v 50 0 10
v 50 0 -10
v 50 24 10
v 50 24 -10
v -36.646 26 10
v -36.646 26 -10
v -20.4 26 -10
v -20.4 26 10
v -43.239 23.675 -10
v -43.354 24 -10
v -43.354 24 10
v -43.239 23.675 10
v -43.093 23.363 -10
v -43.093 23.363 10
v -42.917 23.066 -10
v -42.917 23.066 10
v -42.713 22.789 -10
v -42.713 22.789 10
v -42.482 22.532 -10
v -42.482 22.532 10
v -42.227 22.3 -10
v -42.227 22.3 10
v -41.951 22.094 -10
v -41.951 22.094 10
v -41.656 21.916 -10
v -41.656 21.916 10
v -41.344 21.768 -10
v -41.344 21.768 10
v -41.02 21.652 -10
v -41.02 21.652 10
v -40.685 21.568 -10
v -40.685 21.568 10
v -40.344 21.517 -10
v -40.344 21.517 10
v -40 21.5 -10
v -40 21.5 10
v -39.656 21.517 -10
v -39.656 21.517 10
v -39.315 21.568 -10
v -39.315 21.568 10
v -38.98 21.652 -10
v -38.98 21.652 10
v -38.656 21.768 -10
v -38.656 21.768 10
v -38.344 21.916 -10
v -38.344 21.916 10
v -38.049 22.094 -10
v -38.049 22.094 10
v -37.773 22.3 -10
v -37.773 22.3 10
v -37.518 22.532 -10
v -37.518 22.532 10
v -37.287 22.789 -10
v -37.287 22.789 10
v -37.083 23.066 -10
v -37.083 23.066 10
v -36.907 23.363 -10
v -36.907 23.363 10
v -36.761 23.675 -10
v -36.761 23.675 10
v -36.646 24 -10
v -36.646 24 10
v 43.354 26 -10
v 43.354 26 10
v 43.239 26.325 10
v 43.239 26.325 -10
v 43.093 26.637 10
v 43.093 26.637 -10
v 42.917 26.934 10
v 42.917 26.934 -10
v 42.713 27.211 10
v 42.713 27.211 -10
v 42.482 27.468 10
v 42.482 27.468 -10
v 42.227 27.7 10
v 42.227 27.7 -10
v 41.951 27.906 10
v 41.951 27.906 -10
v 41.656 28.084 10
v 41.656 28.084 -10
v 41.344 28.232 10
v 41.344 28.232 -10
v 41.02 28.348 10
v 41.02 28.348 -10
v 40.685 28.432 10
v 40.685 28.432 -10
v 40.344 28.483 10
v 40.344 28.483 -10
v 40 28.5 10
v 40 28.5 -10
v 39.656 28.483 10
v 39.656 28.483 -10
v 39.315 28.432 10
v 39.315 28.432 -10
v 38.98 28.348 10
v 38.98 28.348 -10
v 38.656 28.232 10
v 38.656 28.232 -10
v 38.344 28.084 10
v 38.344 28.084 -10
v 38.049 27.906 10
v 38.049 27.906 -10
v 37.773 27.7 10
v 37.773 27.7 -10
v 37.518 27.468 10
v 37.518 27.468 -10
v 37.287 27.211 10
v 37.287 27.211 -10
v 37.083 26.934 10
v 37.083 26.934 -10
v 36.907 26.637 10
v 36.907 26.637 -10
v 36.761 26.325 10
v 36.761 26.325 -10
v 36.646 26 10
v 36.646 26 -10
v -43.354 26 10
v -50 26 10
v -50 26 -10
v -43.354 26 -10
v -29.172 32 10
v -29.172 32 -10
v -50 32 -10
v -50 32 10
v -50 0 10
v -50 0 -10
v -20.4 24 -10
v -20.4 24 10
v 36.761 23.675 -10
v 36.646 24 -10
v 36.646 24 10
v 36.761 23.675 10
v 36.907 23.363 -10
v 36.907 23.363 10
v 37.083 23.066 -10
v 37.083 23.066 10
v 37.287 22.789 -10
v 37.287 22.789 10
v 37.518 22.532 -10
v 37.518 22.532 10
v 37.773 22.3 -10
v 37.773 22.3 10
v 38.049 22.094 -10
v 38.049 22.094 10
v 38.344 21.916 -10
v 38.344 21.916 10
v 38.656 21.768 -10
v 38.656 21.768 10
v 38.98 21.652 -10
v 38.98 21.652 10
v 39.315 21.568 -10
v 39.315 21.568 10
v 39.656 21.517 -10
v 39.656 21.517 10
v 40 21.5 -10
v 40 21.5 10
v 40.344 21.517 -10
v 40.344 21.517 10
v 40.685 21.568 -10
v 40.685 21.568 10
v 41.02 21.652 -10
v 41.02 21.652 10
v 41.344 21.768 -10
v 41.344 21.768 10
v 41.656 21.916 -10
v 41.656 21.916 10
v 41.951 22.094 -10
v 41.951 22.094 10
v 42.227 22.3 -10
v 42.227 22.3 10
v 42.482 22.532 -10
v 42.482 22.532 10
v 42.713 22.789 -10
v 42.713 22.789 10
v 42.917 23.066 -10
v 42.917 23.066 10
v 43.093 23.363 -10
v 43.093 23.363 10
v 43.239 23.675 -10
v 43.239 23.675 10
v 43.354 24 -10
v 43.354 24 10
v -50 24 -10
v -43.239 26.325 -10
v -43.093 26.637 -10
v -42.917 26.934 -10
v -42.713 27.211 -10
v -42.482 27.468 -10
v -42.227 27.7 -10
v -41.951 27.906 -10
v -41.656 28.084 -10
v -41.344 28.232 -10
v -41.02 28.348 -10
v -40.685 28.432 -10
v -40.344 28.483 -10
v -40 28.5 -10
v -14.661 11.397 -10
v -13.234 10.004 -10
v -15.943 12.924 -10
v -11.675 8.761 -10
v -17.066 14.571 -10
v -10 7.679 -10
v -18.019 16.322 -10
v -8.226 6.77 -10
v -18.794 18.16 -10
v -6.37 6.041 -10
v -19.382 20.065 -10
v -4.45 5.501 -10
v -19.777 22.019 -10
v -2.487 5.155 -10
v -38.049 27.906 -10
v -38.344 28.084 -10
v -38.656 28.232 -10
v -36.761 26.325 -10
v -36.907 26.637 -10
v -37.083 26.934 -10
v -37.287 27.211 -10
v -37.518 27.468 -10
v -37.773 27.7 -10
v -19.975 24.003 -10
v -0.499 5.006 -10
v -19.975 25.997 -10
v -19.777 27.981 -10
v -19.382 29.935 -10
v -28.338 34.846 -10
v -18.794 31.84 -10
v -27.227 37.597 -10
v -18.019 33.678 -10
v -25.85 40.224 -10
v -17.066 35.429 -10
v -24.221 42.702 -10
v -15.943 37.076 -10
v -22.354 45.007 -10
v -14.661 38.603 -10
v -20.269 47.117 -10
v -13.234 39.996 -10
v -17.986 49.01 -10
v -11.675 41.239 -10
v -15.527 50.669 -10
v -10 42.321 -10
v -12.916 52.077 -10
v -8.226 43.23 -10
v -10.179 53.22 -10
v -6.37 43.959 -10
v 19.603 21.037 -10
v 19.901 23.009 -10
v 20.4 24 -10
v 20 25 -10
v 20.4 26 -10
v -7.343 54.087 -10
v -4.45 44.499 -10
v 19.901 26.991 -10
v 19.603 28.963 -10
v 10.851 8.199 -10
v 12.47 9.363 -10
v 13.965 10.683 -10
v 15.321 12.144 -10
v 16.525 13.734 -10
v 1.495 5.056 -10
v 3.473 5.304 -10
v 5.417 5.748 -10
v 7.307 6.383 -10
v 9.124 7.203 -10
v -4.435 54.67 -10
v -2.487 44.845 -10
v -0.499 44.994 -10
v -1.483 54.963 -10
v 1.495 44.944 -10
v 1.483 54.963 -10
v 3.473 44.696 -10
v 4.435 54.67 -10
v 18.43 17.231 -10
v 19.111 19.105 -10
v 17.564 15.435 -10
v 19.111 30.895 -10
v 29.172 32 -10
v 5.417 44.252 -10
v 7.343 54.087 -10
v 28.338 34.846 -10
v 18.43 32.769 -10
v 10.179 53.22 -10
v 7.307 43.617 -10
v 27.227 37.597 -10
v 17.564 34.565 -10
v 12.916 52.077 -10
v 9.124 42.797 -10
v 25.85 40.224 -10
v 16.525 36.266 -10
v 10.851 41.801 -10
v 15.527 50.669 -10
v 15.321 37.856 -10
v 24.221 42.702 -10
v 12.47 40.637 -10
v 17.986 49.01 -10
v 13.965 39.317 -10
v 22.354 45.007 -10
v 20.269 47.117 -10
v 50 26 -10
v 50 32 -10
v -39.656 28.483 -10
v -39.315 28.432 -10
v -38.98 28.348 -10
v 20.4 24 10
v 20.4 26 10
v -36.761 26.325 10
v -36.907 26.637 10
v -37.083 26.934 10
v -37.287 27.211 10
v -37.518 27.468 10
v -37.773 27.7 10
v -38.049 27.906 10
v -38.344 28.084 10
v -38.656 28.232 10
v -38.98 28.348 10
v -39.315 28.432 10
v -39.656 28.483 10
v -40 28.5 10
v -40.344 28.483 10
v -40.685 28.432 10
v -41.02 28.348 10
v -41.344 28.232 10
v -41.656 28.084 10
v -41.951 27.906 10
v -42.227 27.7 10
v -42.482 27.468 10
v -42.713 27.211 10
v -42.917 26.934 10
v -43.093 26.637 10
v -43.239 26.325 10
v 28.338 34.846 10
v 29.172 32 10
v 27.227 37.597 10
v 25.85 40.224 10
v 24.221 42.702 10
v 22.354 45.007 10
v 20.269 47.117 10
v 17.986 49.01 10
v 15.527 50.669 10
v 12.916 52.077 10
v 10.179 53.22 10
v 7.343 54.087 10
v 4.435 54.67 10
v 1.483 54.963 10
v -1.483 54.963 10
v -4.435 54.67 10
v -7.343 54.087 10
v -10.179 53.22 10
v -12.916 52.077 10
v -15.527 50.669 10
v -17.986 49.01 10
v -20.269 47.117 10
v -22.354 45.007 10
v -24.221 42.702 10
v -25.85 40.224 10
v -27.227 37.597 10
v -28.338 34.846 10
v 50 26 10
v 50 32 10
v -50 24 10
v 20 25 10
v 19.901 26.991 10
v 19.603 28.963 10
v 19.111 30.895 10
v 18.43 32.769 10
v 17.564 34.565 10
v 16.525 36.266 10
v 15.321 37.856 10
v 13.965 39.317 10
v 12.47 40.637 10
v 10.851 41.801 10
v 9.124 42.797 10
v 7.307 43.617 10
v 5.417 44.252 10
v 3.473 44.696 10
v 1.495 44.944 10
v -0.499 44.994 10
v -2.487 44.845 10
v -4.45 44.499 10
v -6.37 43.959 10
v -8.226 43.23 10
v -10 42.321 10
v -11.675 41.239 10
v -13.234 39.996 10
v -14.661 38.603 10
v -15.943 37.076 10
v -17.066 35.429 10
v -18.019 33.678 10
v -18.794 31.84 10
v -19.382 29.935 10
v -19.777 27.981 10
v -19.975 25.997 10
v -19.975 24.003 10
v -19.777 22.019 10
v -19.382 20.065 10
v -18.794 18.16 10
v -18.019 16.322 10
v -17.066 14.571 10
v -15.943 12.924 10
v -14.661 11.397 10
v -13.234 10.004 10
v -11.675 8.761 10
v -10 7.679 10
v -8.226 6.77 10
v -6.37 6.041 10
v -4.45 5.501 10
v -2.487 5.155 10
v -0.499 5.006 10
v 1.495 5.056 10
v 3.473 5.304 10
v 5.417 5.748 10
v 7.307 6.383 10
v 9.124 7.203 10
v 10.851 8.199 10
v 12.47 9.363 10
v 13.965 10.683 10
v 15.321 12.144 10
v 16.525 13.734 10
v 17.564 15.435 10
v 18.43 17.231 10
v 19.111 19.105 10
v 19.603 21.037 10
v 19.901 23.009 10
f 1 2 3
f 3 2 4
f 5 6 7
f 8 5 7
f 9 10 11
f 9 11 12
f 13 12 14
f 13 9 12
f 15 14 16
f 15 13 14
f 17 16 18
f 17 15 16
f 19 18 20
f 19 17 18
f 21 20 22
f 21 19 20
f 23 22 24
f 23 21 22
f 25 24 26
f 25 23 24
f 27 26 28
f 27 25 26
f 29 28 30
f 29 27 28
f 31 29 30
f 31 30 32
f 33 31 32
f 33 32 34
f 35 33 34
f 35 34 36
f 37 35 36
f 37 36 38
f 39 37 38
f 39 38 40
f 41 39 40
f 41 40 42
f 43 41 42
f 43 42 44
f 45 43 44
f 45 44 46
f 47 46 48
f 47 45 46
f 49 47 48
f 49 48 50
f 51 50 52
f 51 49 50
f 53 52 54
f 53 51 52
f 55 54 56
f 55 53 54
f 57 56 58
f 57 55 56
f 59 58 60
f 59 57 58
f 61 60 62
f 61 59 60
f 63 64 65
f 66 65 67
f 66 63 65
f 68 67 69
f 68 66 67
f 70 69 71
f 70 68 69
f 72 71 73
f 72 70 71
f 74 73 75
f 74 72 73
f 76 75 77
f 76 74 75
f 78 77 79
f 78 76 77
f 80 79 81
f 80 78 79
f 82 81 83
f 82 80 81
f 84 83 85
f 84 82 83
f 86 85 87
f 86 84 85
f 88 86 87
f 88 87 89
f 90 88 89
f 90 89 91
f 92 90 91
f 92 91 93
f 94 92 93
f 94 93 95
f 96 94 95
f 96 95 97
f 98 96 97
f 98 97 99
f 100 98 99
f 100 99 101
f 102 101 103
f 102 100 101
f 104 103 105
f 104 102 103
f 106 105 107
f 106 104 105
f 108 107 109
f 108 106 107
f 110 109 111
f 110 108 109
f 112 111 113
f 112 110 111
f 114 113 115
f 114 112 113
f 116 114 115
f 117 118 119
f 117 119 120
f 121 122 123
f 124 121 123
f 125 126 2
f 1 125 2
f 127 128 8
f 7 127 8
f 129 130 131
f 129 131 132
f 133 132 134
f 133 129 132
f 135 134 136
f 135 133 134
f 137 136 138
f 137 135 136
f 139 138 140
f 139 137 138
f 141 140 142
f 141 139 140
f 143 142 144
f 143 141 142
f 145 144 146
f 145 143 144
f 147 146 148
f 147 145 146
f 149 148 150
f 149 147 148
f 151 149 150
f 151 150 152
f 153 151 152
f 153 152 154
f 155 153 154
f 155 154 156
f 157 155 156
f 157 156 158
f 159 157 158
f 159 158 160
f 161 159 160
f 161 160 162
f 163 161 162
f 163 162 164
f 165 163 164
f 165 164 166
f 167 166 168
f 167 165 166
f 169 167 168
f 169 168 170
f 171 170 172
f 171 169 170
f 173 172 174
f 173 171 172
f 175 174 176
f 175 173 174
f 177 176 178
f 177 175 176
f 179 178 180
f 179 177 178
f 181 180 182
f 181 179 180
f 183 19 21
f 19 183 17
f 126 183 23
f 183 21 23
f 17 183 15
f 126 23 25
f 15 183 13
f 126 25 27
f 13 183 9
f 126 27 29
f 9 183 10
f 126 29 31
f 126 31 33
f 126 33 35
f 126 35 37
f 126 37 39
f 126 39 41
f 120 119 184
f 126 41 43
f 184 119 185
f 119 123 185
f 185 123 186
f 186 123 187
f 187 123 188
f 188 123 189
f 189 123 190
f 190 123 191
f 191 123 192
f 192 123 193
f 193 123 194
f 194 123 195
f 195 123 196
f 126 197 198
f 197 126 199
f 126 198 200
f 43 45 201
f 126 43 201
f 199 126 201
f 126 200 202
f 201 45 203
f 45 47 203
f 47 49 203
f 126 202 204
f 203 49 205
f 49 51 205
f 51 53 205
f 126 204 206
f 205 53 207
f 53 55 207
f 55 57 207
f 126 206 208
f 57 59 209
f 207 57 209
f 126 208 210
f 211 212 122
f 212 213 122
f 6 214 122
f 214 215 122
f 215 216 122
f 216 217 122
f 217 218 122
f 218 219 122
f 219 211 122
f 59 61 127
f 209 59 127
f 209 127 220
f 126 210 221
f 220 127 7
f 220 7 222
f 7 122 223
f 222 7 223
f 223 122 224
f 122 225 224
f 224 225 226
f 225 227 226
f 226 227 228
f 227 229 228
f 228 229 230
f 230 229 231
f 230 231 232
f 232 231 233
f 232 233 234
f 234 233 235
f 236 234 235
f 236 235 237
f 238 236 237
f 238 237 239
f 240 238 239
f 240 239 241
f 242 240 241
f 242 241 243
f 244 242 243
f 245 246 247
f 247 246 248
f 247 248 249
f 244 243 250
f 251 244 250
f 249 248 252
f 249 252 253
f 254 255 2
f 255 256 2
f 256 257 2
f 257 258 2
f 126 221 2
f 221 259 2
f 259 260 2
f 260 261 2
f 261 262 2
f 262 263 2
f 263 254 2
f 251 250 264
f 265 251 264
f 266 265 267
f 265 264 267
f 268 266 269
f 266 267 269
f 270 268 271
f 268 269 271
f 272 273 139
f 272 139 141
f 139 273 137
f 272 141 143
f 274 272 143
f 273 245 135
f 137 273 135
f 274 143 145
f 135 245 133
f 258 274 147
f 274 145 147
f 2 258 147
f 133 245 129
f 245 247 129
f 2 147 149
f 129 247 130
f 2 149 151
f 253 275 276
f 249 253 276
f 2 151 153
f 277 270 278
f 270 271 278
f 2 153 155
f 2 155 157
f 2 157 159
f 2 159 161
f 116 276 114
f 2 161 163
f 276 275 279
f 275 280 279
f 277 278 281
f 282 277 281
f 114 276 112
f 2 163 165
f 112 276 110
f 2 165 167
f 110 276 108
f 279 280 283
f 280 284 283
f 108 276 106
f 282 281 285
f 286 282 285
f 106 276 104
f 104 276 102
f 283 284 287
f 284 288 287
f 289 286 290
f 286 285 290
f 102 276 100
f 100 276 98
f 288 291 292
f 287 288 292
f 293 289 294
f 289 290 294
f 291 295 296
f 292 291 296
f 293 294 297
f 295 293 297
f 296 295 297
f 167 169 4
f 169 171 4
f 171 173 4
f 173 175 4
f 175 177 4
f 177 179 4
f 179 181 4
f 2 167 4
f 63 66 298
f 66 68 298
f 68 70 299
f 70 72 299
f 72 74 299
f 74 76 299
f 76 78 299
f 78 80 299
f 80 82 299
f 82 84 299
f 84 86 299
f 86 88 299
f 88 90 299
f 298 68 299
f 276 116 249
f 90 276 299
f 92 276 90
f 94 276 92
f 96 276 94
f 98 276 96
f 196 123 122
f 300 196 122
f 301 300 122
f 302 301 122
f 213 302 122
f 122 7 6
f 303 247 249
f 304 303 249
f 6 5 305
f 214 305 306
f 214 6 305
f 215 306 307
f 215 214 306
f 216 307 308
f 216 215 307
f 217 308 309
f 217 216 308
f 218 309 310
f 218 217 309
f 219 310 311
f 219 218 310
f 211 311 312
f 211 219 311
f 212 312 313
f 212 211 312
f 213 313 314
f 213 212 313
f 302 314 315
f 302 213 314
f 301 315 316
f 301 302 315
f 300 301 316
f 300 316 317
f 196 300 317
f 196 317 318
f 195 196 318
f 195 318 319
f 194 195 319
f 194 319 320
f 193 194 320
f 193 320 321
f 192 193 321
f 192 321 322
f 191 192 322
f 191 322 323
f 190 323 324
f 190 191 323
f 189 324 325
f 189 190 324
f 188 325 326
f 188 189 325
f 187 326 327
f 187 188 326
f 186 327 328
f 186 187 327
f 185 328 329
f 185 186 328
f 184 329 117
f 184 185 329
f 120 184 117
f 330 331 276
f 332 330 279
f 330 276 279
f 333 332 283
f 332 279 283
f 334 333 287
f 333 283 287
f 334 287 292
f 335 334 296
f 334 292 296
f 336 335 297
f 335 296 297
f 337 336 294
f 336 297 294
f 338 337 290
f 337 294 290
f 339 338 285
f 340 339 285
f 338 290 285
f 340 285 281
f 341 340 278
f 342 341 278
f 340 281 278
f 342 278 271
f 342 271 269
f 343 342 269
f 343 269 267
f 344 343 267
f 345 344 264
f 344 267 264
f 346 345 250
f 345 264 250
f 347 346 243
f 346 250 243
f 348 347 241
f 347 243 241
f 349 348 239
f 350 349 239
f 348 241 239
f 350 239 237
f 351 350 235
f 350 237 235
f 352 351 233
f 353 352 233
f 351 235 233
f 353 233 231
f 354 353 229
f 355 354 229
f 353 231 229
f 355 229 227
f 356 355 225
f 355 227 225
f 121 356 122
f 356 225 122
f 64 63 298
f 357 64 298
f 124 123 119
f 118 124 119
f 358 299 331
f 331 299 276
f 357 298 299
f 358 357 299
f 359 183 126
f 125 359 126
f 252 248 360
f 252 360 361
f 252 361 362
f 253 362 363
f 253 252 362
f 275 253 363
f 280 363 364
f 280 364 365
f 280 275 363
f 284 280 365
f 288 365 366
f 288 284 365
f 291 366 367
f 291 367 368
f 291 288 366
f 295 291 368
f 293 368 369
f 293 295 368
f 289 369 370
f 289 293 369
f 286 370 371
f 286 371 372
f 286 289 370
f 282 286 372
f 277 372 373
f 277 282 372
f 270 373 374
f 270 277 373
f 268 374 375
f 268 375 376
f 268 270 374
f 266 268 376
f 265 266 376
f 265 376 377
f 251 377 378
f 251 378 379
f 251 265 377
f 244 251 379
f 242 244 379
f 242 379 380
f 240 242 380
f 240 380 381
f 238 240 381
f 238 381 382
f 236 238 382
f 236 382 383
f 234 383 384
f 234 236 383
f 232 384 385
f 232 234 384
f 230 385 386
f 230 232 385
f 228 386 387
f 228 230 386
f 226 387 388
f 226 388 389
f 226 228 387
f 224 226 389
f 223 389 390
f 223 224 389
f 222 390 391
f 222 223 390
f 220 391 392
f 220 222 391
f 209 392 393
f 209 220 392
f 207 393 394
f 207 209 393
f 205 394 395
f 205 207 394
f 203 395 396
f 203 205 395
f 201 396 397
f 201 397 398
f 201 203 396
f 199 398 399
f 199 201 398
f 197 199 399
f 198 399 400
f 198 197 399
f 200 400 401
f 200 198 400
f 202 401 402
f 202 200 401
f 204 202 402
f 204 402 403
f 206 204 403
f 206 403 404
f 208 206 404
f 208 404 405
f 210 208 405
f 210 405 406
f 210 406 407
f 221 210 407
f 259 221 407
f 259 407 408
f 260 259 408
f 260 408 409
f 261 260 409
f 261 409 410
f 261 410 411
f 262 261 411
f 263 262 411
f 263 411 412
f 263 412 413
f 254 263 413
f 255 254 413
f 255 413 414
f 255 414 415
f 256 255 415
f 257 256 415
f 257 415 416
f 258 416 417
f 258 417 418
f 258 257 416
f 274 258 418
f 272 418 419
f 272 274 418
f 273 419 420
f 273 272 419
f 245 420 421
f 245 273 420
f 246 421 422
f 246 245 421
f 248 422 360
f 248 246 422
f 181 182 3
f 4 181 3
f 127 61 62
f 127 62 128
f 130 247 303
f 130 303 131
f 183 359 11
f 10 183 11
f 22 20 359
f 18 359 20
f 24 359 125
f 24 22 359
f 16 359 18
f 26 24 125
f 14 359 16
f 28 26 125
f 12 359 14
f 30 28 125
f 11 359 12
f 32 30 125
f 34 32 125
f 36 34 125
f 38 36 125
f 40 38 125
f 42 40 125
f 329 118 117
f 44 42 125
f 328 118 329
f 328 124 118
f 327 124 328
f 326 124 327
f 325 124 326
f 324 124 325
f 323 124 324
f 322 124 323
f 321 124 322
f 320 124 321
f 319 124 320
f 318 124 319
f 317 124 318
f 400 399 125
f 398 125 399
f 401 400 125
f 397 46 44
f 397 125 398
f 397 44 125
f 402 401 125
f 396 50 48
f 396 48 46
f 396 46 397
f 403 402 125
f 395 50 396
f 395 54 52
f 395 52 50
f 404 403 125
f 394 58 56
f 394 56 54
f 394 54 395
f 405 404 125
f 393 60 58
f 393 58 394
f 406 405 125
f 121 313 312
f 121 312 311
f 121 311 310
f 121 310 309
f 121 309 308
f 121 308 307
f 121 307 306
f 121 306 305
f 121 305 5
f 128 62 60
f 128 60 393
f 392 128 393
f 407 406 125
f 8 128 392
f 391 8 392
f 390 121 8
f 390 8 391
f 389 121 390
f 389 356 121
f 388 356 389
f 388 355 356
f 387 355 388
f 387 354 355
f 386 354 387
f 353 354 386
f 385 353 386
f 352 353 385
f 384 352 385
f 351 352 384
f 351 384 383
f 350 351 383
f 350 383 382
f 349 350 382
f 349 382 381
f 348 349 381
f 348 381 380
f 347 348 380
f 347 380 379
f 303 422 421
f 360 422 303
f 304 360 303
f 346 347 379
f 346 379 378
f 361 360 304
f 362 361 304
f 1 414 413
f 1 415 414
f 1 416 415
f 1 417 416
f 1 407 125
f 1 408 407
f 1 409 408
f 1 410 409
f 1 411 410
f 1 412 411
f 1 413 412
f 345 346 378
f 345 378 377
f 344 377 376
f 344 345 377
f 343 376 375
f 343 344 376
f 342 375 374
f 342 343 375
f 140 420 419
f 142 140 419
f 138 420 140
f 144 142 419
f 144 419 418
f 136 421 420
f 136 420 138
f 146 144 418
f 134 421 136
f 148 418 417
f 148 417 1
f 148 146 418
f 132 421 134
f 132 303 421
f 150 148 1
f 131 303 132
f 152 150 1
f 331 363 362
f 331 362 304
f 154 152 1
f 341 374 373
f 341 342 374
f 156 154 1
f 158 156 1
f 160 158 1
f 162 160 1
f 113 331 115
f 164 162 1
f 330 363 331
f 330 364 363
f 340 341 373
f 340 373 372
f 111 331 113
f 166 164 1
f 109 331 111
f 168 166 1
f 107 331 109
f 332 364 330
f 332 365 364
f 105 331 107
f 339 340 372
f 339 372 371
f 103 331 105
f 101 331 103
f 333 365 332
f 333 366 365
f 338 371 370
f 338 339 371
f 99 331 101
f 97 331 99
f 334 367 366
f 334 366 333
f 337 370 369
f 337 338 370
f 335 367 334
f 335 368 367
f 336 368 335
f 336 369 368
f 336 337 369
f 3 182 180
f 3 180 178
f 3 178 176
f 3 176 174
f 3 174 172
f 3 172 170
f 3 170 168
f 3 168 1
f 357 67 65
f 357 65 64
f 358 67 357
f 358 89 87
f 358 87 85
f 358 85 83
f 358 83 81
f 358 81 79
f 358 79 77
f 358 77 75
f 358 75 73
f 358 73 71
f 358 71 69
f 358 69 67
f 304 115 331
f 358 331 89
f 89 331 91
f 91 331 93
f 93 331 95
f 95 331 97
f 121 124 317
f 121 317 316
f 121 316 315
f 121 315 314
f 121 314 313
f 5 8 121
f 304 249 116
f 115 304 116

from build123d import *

# Parameters (mm, degrees)
SKETCH_6_R          = 20
EXTRUDE_6_DEPTH     = 20
SKETCH_8_W          = 30.6
SKETCH_8_H          = 2
CUT_EXTRUDE_2_DEPTH = 101
SKETCH_9_R          = 3.5
CUT_EXTRUDE_3_DEPTH = 77.97401861


with BuildPart() as part:
    # 草图6 → 凸台-拉伸6 (new body)
    with BuildSketch(Plane.XY.offset(-10)):
        with BuildLine():
            Line((-50, 0), (50, 0))
            Line((50, 0), (50, 32))
            Line((50, 32), (29.1719, 32))
            ThreePointArc((29.1719, 32), (0, 54.999995827), (-29.1719, 32))
            Line((-29.1719, 32), (-50, 32))
            Line((-50, 32), (-50, 0))
        make_face()
        with Locations((0, 25)):
            Circle(SKETCH_6_R, mode=Mode.SUBTRACT)
    extrude(amount=EXTRUDE_6_DEPTH)

    # 草图8 → 切除-拉伸2 (cut, symmetric)
    with BuildSketch(Plane.XY.offset(-10)):
        with Locations((35.7, 25)):
            Rectangle(SKETCH_8_W, SKETCH_8_H)
        with Locations((-35.7, 25)):
            Rectangle(SKETCH_8_W, SKETCH_8_H)
    extrude(amount=CUT_EXTRUDE_2_DEPTH, both=True, mode=Mode.SUBTRACT)

    # 草图9 → 切除-拉伸3 (cut, through all)
    with BuildSketch(Plane.XY.offset(-10)):
        with Locations((-40, 25)):
            Circle(SKETCH_9_R)
        with Locations((40, 25)):
            Circle(SKETCH_9_R)
    extrude(amount=CUT_EXTRUDE_3_DEPTH, mode=Mode.SUBTRACT)


solid = part.part
